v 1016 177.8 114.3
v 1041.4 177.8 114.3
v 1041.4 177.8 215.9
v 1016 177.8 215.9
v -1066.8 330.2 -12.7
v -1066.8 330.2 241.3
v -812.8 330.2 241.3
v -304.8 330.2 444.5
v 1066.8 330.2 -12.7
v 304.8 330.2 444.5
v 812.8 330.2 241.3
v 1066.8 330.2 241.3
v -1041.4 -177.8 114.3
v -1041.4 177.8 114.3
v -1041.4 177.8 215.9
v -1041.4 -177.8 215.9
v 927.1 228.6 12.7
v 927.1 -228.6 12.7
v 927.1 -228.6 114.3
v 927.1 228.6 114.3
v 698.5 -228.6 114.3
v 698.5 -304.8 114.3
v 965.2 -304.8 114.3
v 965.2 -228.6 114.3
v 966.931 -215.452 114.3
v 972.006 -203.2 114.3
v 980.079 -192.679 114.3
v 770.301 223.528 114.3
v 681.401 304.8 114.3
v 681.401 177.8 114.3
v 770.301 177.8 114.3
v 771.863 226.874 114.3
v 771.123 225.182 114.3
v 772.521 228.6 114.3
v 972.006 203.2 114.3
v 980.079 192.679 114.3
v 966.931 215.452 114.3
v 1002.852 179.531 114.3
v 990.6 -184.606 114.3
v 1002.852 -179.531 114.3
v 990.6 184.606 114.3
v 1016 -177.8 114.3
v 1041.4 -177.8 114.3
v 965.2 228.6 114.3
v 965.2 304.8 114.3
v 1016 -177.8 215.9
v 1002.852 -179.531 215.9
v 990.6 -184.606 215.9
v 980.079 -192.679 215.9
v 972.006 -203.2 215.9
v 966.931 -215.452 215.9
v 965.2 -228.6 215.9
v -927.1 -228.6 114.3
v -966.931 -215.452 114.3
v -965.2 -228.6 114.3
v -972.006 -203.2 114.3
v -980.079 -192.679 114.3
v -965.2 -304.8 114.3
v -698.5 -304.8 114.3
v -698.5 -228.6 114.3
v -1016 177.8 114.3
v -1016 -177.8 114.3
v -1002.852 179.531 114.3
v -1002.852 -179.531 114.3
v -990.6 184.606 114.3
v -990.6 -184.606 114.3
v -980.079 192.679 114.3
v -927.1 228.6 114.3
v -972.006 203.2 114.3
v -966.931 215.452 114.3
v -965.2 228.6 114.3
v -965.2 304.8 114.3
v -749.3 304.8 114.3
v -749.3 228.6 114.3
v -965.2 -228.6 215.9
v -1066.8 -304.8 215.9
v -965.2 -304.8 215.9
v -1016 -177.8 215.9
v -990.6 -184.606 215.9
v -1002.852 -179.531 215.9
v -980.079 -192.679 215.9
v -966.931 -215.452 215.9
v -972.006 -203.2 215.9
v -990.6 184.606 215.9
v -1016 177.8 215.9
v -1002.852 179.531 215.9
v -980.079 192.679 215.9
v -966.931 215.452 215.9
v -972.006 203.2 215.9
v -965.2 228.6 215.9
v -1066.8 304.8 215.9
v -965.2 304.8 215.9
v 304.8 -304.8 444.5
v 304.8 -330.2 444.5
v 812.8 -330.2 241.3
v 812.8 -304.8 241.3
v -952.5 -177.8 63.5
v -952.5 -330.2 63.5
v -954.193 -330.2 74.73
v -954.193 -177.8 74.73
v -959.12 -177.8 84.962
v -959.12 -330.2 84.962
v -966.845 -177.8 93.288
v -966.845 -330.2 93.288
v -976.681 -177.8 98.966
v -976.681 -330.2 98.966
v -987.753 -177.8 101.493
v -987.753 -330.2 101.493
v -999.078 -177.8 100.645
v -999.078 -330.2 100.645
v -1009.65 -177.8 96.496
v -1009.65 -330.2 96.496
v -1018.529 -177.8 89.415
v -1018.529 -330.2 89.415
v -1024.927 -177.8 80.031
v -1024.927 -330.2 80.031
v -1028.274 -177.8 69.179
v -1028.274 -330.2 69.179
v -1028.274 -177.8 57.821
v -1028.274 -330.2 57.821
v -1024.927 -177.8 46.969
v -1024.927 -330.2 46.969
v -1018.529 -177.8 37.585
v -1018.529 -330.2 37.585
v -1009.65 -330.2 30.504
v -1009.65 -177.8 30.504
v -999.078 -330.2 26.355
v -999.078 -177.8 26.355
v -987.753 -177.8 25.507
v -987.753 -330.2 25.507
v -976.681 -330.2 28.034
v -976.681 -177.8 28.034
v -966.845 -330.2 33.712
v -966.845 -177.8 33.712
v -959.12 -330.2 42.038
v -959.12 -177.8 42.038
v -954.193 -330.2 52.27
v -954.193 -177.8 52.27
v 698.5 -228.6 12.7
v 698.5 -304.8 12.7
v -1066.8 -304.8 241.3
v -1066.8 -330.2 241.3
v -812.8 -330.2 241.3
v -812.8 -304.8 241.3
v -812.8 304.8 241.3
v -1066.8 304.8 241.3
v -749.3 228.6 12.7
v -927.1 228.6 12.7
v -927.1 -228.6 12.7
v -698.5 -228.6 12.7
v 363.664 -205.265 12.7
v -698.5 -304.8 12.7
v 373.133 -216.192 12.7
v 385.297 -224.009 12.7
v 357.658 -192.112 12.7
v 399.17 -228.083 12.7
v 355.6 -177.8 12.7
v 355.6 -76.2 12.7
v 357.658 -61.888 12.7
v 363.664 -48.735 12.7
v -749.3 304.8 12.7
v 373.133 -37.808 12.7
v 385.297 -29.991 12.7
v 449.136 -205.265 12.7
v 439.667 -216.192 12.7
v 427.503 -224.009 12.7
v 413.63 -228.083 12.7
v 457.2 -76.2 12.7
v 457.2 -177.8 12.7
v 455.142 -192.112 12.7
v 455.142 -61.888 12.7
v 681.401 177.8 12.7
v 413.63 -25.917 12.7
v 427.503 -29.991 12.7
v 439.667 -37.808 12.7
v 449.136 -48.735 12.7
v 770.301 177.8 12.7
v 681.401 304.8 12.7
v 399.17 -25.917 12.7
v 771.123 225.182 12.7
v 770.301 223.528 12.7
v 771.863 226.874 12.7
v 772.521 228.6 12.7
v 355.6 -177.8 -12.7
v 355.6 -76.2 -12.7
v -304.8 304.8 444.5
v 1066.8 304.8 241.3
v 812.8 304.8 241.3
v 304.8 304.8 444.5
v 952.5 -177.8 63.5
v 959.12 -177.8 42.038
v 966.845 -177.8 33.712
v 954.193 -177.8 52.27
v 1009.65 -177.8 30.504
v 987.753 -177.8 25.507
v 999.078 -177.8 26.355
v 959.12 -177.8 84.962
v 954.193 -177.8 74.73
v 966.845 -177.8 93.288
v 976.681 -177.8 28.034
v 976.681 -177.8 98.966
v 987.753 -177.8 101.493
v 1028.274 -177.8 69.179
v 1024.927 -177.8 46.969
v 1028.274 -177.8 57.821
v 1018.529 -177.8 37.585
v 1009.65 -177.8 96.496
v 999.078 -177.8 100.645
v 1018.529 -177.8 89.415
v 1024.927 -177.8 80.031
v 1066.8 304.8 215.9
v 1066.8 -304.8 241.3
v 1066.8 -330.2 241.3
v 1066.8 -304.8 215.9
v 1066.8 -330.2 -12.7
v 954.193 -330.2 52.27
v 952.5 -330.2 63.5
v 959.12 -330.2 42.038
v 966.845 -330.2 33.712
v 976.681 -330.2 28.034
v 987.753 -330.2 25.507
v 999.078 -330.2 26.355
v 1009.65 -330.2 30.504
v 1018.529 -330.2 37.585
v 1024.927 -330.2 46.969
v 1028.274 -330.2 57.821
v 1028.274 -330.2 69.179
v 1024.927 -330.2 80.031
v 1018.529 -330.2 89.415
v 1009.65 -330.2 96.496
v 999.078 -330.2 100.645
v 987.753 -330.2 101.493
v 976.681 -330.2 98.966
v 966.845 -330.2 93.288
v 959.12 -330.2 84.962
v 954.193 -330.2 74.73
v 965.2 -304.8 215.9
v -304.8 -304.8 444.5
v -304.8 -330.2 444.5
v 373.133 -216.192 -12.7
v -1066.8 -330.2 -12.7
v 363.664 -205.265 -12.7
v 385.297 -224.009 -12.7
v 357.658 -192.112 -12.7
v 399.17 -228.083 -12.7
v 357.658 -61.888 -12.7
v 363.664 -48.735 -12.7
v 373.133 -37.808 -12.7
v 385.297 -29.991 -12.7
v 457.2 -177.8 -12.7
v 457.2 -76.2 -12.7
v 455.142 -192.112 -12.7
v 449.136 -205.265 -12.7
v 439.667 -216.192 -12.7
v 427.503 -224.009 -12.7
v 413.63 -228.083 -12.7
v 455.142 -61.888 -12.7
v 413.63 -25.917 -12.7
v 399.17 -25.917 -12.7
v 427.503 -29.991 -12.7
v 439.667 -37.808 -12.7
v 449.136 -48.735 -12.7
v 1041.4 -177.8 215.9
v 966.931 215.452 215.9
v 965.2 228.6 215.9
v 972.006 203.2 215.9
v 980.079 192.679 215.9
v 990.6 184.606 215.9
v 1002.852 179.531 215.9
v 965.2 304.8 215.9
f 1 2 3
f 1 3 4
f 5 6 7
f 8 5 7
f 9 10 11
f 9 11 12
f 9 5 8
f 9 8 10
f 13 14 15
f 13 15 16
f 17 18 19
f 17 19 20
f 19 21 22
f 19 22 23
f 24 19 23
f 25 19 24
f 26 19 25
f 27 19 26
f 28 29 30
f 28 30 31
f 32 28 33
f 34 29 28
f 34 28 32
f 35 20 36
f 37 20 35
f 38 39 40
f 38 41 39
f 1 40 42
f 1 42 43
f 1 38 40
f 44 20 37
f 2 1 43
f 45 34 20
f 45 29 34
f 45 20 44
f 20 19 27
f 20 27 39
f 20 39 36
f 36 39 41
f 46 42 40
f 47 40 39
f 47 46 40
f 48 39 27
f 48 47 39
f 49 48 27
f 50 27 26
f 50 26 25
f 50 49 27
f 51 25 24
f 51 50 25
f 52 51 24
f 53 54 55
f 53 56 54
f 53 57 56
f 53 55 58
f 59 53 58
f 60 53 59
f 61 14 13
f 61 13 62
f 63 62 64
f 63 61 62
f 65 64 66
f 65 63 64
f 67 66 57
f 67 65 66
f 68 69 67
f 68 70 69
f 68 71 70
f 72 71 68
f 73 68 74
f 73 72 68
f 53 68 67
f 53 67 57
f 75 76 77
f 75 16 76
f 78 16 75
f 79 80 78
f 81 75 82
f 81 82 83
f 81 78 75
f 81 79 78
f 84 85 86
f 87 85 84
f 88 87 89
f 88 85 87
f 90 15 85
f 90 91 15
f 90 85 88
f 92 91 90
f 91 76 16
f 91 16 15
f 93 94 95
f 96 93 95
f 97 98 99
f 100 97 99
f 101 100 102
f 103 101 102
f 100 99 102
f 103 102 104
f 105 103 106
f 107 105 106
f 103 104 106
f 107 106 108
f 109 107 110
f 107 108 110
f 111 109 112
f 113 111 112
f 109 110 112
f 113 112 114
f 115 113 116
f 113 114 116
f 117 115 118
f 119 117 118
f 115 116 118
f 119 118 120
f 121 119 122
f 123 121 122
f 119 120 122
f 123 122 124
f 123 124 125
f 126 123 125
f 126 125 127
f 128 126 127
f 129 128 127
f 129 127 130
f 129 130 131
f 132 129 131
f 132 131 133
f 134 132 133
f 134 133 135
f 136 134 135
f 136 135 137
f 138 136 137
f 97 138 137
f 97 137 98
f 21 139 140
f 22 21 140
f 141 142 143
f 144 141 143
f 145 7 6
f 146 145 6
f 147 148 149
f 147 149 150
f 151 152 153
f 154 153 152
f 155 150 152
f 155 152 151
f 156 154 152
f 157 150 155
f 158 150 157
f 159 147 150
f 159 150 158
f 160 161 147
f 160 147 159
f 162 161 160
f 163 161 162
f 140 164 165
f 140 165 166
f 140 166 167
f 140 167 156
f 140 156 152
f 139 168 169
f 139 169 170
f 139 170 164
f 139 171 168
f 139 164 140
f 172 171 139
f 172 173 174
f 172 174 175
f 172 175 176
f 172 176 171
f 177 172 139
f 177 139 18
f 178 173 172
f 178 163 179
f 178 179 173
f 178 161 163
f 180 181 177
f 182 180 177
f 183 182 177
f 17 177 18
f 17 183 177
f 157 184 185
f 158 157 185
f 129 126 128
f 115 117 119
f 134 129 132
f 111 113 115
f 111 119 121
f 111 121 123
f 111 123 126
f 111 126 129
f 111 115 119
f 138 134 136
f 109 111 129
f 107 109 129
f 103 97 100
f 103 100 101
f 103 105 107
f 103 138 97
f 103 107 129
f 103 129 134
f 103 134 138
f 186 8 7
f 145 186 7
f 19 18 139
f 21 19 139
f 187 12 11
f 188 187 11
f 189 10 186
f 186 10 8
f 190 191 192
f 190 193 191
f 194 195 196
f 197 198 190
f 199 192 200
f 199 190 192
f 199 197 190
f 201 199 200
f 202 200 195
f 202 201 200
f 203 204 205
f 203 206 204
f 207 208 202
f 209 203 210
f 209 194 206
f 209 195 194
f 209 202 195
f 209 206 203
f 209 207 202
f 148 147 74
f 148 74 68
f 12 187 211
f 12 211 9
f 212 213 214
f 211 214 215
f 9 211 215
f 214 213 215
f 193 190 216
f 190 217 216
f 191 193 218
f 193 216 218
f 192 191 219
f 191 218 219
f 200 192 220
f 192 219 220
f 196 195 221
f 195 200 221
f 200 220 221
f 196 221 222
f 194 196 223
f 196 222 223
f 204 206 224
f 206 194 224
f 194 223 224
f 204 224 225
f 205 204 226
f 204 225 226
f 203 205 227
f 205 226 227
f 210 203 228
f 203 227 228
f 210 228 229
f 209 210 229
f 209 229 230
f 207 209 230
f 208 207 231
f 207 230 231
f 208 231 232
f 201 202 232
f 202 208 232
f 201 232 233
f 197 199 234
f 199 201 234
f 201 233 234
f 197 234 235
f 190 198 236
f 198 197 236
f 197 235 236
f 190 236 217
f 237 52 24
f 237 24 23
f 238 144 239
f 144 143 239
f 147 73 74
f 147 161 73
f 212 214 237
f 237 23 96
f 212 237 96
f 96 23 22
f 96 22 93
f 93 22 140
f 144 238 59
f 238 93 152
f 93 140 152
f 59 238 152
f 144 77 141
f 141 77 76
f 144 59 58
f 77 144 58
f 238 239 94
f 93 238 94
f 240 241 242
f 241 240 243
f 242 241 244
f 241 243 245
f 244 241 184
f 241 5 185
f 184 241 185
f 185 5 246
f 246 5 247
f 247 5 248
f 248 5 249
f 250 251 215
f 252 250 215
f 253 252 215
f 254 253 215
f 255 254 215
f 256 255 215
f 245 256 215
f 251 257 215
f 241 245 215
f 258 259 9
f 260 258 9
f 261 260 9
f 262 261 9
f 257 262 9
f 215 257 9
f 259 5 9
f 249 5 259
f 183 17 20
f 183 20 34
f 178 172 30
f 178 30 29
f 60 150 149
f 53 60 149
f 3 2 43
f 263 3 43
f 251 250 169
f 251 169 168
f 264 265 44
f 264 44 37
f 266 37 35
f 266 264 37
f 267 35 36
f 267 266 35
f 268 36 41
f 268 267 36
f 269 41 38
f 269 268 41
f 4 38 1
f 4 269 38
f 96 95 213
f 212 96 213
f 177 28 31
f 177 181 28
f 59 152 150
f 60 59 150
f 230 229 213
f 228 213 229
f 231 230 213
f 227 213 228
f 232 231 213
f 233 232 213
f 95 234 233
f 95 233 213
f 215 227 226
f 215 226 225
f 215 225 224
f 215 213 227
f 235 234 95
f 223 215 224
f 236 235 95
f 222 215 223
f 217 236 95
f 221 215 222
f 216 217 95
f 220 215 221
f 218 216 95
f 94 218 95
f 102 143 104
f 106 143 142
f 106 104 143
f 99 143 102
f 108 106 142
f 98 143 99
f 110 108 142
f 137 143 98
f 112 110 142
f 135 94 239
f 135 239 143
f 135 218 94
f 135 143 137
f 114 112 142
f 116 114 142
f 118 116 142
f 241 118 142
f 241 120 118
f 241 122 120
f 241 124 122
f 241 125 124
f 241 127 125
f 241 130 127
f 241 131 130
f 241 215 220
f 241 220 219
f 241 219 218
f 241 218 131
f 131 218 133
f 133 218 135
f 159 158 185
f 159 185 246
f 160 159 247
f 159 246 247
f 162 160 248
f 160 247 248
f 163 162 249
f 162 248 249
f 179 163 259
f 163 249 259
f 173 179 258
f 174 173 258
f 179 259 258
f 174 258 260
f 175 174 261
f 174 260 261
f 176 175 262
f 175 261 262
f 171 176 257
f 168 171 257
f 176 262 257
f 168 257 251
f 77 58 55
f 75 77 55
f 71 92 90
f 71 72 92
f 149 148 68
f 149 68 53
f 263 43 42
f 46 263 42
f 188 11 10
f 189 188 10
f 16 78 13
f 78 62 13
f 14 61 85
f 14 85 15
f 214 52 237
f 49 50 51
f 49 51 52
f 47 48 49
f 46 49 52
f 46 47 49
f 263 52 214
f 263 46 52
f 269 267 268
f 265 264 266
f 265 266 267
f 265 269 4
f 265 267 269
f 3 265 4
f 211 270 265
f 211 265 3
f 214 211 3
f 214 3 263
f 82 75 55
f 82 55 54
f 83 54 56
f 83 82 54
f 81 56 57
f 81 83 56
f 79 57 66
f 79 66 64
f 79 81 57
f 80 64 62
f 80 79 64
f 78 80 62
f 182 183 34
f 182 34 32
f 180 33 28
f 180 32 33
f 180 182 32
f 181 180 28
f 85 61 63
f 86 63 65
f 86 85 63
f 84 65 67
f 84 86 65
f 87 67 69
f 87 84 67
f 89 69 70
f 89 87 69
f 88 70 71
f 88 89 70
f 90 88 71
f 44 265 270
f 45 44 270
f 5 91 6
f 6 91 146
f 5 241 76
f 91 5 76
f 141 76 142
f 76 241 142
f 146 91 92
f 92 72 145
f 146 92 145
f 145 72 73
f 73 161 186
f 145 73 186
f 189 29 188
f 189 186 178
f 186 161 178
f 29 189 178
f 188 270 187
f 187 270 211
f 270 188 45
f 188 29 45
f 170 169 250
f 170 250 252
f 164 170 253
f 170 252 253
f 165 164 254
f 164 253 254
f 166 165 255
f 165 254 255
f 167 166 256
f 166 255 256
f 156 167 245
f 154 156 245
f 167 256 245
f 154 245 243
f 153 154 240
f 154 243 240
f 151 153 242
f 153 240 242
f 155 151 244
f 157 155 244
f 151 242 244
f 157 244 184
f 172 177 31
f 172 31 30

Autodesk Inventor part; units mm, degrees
ref_plane "YZ Plane" through (0, 0, 0) normal (1, 0, 0) x (0, 1, 0)
ref_plane "XZ Plane" through (0, 0, 0) normal (0, 1, 0) x (-1, 0, 0)
ref_plane "XY Plane" through (0, 0, 0) normal (0, 0, 1) x (1, 0, 0)
sketch "Sketch1" plane through (0, 0, 0) normal (0, 0, 1) x (1, 0, 0)
  line L0 (-1066.8, 304.8) -> (1066.8, 304.8)
  line L1 (1066.8, 304.8) -> (1066.8, -304.8)
  line L2 (1066.8, -304.8) -> (-1066.8, -304.8)
  line L3 (-1066.8, -304.8) -> (-1066.8, 304.8)
  point P0 (0, 0)
  point P1 (1066.8, 0)
  point P2 (0, 304.8)
  dimension "d0" = 2133.6
  dimension "d1" = 609.6
extrude "Extrusion1" add sketch "Sketch1" along normal mid plane 25.4
sketch "Sketch2" plane through (0, 0, 12.7) normal (0, 0, 1) x (1, 0, 0)
  circle A0 centre (736.6, 241.3) radius 38.1
  line L0 (1066.8, -304.8) -> (1066.8, 304.8) projected
  line L1 (-1066.8, 304.8) -> (1066.8, 304.8) projected
  circle A1 centre (736.6, -266.7) radius 38.1
  line L2 (-1066.8, -304.8) -> (1066.8, -304.8) projected
  circle A2 centre (-787.4, 266.7) radius 38.1
  circle A3 centre (-736.6, -266.7) radius 38.1
  line L3 (-1066.8, 304.8) -> (-1066.8, -304.8) projected
  point P0 (0, 0)
  dimension "d4" = 330.2
  dimension "d5" = 63.5
  dimension "d6" = 76.2
  dimension "d7" = 76.2
  dimension "d8" = 330.2
  dimension "d9" = 38.1
  dimension "d10" = 76.2
  dimension "d11" = 76.2
  dimension "d12" = 279.4
  dimension "d13" = 330.2
  dimension "d14" = 38.1
  dimension "d15" = 38.1
extrude "Extrusion2" add sketch "Sketch2" along normal blind 101.6 contours A0 | A2 | A3 | A1
sketch "Sketch3" plane through (0, 0, 12.7) normal (0, 0, 1) x (1, 0, 0)
  line L0 (-1066.8, -304.8) -> (-1066.8, 304.8) projected
  line L1 (1066.8, -304.8) -> (-1066.8, -304.8) projected
  line L2 (-1066.8, 304.8) -> (-1041.4, 304.8)
  line L3 (-1041.4, 304.8) -> (-1041.4, -304.8)
  line L4 (-1041.4, -304.8) -> (-1066.8, -304.8)
  line L5 (-1066.8, -304.8) -> (-1066.8, 304.8)
  line L6 (1066.8, 304.8) -> (1041.4, 304.8)
  line L7 (1041.4, 304.8) -> (1041.4, -304.8)
  line L8 (1041.4, -304.8) -> (1066.8, -304.8)
  line L9 (1066.8, -304.8) -> (1066.8, 304.8)
  point P0 (0, 0)
  dimension "d18" = 25.4
  dimension "d19" = 25.4
extrude "Extrusion3" add sketch "Sketch3" along normal blind 203.2
sketch "Sketch5" plane through (0, 0, 0) normal (0, 1, 0) x (-1, 0, 0)
  line L0 (-1041.4, 12.7) -> (787.4, 12.7) projected
  point P0 (0, 0)
sketch "Sketch6" plane through (0, 0, 12.7) normal (0, 0, 1) x (1, 0, 0)
  line L0 (-1041.4, 304.8) -> (-1041.4, -304.8) projected
  line L1 (-1041.4, 304.8) -> (-965.2, 304.8)
  line L2 (-965.2, 304.8) -> (-965.2, 177.8)
  line L3 (-965.2, 177.8) -> (-1041.4, 177.8)
  line L4 (-1041.4, 177.8) -> (-1041.4, 304.8)
  line L5 (-1041.4, -304.8) -> (-965.2, -304.8)
  line L6 (-965.2, -304.8) -> (-965.2, -177.8)
  line L7 (-965.2, -177.8) -> (-1041.4, -177.8)
  line L8 (-1041.4, -177.8) -> (-1041.4, -304.8)
  point P0 (0, 0)
  dimension "d30" = 76.2
  dimension "d31" = 127
  dimension "d32" = 127
  dimension "d33" = 76.2
extrude "Extrusion5" add sketch "Sketch6" along normal blind 203.2
mirror "Mirror1" about plane through (0, 0, 0) normal (1, 0, 0) of "Extrusion5"
fillet "Fillet1" radius 50.8 4 edges at (-965.2, 177.8, 114.3) (965.2, 177.8, 114.3) (965.2, -177.8, 114.3) (-965.2, -177.8, 114.3)
sketch "Sketch14" plane through (0, 0, -12.7) normal (0, 0, -1) x (-1, 0, 0)
  line L0 (-1066.8, 304.8) -> (1066.8, 304.8)
  line L1 (1066.8, 304.8) -> (1066.8, 330.2)
  line L2 (1066.8, 330.2) -> (-1066.8, 330.2)
  line L3 (-1066.8, 330.2) -> (-1066.8, 304.8)
  line L4 (1066.8, -304.8) -> (-1066.8, -304.8)
  line L5 (-1066.8, -304.8) -> (-1066.8, -330.2)
  line L6 (-1066.8, -330.2) -> (1066.8, -330.2)
  line L7 (1066.8, -330.2) -> (1066.8, -304.8)
  point P0 (0, 0)
  dimension "d62" = 25.4
  dimension "d63" = 25.4
extrude "Extrusion11" add sketch "Sketch14" against normal blind 228.6
sketch "Sketch15" plane through (-1066.8, 330.2, -12.7) normal (0, 1, 0) x (1, 0, 0)
  line L0 (2133.6, 0) -> (2133.6, -228.6) projected
  line L1 (2133.6, -228.6) -> (2133.6, -254)
  line L2 (2133.6, -254) -> (1879.6, -254)
  line L3 (1879.6, -254) -> (1371.6, -457.2)
  line L4 (1371.6, -457.2) -> (762, -457.2)
  line L5 (762, -457.2) -> (254, -254)
  line L6 (254, -254) -> (0, -254)
  line L7 (0, -254) -> (0, -228.6)
  line L8 (0, -228.6) -> (2133.6, -228.6)
  point P0 (1066.8, -12.7)
  dimension "d66" = 254
  dimension "d67" = 508
  dimension "d68" = 609.6
  dimension "d69" = 508
  dimension "d70" = 254
  dimension "d71" = 228.6
  dimension "d72" = 25.4
  dimension "d73" = 25.4
extrude "Extrusion12" add sketch "Sketch15" against normal blind 25.4
mirror "Mirror4" about plane through (0, 0, 0) normal (0, 1, 0) of "Extrusion12"
sketch "Sketch16" plane through (0, 0, -12.7) normal (0, 0, -1) x (-1, 0, 0)
  line L0 (-457.2, -177.8) -> (-457.2, -76.2)
  line L1 (-355.6, -177.8) -> (-355.6, -76.2)
  arc A0 (-355.6, -76.2) -> (-457.2, -76.2) centre (-406.4, -76.2) ccw
  arc A1 (-457.2, -177.8) -> (-355.6, -177.8) centre (-406.4, -177.8) ccw
  line L2 (-1066.8, 330.2) -> (-1066.8, -330.2) projected
  line L3 (-1066.8, -330.2) -> (1066.8, -330.2) projected
  point P0 (0, 0)
  dimension "d76" = 101.6
  dimension "d77" = 609.6
  dimension "d78" = 152.4
  dimension "d79" = 101.6
extrude "Extrusion13" cut sketch "Sketch16" against normal blind 25.4
sketch "Sketch20" plane through (0, 0, 12.7) normal (0, 0, 1) x (1, 0, 0)
  line L0 (-965.2, 304.8) -> (-1066.8, 304.8) projected
  line L1 (-1041.4, 304.8) -> (-749.3, 304.8)
  line L2 (-749.3, 304.8) -> (-749.3, 228.6)
  line L3 (-749.3, 228.6) -> (-1041.4, 228.6)
  line L4 (-1041.4, 228.6) -> (-1041.4, 304.8)
  line L5 (-965.2, -304.8) -> (-1028.7, -304.8) projected
  line L6 (-1016, -304.8) -> (-698.5, -304.8)
  line L7 (-698.5, -304.8) -> (-698.5, -228.6)
  line L8 (-698.5, -228.6) -> (-1016, -228.6)
  line L9 (-1016, -228.6) -> (-1016, -304.8)
  point P0 (0, 0)
extrude "Extrusion16" add sketch "Sketch20" along normal blind 101.6
mirror "Mirror5" about plane through (0, 0, 0) normal (1, 0, 0) of "Extrusion16"
sketch "Sketch21" plane through (0, 0, 12.7) normal (0, 0, 1) x (1, 0, 0)
  line L0 (812.8, 304.8) -> (304.8, 304.8) projected
  line L1 (681.4009, 304.8) -> (770.3009, 304.8)
  line L2 (770.3009, 304.8) -> (770.3009, 177.8)
  line L3 (770.3009, 177.8) -> (681.4009, 177.8)
  line L4 (681.4009, 177.8) -> (681.4009, 304.8)
  point P0 (0, 0)
  dimension "d91" = 127
  dimension "d92" = 88.9
extrude "Extrusion17" add sketch "Sketch21" along normal blind 101.6
sketch "Sketch22" plane through (0, 0, 12.7) normal (0, 0, 1) x (1, 0, 0)
  line L0 (-812.8, 304.8) -> (-1066.8, 304.8) projected
  line L1 (-812.8, -304.8) -> (-1066.8, -304.8) projected
  line L2 (-1041.4, 304.8) -> (-927.1, 304.8)
  line L3 (-927.1, 304.8) -> (-927.1, -304.8)
  line L4 (-927.1, -304.8) -> (-1041.4, -304.8)
  line L5 (-1041.4, -304.8) -> (-1041.4, 304.8)
  line L6 (-1041.4, -177.8) -> (-1041.4, 177.8) projected
  point P0 (0, 0)
  dimension "d97" = 114.3
  dimension "d98" = 0
extrude "Extrusion18" add sketch "Sketch22" along normal blind 101.6
mirror "Mirror7" about plane through (0, 0, 0) normal (1, 0, 0) of "Extrusion18"
sketch "Sketch23" plane through (-1066.8, -330.2, -12.7) normal (0, -1, 0) x (1, 0, 0)
  circle A0 centre (76.2, 76.2) radius 38.1
  line L0 (0, 0) -> (0, 254) projected
  line L1 (2133.6, 0) -> (0, 0) projected
  point P0 (1066.8, 12.7)
  dimension "d101" = 76.2
  dimension "d102" = 76.2
  dimension "d103" = 76.2
extrude "Extrusion19" cut sketch "Sketch23" against normal blind 152.4
mirror "Mirror8" about plane through (0, 0, 0) normal (1, 0, 0) of "Extrusion19"
properties part number "Cam_support2"
